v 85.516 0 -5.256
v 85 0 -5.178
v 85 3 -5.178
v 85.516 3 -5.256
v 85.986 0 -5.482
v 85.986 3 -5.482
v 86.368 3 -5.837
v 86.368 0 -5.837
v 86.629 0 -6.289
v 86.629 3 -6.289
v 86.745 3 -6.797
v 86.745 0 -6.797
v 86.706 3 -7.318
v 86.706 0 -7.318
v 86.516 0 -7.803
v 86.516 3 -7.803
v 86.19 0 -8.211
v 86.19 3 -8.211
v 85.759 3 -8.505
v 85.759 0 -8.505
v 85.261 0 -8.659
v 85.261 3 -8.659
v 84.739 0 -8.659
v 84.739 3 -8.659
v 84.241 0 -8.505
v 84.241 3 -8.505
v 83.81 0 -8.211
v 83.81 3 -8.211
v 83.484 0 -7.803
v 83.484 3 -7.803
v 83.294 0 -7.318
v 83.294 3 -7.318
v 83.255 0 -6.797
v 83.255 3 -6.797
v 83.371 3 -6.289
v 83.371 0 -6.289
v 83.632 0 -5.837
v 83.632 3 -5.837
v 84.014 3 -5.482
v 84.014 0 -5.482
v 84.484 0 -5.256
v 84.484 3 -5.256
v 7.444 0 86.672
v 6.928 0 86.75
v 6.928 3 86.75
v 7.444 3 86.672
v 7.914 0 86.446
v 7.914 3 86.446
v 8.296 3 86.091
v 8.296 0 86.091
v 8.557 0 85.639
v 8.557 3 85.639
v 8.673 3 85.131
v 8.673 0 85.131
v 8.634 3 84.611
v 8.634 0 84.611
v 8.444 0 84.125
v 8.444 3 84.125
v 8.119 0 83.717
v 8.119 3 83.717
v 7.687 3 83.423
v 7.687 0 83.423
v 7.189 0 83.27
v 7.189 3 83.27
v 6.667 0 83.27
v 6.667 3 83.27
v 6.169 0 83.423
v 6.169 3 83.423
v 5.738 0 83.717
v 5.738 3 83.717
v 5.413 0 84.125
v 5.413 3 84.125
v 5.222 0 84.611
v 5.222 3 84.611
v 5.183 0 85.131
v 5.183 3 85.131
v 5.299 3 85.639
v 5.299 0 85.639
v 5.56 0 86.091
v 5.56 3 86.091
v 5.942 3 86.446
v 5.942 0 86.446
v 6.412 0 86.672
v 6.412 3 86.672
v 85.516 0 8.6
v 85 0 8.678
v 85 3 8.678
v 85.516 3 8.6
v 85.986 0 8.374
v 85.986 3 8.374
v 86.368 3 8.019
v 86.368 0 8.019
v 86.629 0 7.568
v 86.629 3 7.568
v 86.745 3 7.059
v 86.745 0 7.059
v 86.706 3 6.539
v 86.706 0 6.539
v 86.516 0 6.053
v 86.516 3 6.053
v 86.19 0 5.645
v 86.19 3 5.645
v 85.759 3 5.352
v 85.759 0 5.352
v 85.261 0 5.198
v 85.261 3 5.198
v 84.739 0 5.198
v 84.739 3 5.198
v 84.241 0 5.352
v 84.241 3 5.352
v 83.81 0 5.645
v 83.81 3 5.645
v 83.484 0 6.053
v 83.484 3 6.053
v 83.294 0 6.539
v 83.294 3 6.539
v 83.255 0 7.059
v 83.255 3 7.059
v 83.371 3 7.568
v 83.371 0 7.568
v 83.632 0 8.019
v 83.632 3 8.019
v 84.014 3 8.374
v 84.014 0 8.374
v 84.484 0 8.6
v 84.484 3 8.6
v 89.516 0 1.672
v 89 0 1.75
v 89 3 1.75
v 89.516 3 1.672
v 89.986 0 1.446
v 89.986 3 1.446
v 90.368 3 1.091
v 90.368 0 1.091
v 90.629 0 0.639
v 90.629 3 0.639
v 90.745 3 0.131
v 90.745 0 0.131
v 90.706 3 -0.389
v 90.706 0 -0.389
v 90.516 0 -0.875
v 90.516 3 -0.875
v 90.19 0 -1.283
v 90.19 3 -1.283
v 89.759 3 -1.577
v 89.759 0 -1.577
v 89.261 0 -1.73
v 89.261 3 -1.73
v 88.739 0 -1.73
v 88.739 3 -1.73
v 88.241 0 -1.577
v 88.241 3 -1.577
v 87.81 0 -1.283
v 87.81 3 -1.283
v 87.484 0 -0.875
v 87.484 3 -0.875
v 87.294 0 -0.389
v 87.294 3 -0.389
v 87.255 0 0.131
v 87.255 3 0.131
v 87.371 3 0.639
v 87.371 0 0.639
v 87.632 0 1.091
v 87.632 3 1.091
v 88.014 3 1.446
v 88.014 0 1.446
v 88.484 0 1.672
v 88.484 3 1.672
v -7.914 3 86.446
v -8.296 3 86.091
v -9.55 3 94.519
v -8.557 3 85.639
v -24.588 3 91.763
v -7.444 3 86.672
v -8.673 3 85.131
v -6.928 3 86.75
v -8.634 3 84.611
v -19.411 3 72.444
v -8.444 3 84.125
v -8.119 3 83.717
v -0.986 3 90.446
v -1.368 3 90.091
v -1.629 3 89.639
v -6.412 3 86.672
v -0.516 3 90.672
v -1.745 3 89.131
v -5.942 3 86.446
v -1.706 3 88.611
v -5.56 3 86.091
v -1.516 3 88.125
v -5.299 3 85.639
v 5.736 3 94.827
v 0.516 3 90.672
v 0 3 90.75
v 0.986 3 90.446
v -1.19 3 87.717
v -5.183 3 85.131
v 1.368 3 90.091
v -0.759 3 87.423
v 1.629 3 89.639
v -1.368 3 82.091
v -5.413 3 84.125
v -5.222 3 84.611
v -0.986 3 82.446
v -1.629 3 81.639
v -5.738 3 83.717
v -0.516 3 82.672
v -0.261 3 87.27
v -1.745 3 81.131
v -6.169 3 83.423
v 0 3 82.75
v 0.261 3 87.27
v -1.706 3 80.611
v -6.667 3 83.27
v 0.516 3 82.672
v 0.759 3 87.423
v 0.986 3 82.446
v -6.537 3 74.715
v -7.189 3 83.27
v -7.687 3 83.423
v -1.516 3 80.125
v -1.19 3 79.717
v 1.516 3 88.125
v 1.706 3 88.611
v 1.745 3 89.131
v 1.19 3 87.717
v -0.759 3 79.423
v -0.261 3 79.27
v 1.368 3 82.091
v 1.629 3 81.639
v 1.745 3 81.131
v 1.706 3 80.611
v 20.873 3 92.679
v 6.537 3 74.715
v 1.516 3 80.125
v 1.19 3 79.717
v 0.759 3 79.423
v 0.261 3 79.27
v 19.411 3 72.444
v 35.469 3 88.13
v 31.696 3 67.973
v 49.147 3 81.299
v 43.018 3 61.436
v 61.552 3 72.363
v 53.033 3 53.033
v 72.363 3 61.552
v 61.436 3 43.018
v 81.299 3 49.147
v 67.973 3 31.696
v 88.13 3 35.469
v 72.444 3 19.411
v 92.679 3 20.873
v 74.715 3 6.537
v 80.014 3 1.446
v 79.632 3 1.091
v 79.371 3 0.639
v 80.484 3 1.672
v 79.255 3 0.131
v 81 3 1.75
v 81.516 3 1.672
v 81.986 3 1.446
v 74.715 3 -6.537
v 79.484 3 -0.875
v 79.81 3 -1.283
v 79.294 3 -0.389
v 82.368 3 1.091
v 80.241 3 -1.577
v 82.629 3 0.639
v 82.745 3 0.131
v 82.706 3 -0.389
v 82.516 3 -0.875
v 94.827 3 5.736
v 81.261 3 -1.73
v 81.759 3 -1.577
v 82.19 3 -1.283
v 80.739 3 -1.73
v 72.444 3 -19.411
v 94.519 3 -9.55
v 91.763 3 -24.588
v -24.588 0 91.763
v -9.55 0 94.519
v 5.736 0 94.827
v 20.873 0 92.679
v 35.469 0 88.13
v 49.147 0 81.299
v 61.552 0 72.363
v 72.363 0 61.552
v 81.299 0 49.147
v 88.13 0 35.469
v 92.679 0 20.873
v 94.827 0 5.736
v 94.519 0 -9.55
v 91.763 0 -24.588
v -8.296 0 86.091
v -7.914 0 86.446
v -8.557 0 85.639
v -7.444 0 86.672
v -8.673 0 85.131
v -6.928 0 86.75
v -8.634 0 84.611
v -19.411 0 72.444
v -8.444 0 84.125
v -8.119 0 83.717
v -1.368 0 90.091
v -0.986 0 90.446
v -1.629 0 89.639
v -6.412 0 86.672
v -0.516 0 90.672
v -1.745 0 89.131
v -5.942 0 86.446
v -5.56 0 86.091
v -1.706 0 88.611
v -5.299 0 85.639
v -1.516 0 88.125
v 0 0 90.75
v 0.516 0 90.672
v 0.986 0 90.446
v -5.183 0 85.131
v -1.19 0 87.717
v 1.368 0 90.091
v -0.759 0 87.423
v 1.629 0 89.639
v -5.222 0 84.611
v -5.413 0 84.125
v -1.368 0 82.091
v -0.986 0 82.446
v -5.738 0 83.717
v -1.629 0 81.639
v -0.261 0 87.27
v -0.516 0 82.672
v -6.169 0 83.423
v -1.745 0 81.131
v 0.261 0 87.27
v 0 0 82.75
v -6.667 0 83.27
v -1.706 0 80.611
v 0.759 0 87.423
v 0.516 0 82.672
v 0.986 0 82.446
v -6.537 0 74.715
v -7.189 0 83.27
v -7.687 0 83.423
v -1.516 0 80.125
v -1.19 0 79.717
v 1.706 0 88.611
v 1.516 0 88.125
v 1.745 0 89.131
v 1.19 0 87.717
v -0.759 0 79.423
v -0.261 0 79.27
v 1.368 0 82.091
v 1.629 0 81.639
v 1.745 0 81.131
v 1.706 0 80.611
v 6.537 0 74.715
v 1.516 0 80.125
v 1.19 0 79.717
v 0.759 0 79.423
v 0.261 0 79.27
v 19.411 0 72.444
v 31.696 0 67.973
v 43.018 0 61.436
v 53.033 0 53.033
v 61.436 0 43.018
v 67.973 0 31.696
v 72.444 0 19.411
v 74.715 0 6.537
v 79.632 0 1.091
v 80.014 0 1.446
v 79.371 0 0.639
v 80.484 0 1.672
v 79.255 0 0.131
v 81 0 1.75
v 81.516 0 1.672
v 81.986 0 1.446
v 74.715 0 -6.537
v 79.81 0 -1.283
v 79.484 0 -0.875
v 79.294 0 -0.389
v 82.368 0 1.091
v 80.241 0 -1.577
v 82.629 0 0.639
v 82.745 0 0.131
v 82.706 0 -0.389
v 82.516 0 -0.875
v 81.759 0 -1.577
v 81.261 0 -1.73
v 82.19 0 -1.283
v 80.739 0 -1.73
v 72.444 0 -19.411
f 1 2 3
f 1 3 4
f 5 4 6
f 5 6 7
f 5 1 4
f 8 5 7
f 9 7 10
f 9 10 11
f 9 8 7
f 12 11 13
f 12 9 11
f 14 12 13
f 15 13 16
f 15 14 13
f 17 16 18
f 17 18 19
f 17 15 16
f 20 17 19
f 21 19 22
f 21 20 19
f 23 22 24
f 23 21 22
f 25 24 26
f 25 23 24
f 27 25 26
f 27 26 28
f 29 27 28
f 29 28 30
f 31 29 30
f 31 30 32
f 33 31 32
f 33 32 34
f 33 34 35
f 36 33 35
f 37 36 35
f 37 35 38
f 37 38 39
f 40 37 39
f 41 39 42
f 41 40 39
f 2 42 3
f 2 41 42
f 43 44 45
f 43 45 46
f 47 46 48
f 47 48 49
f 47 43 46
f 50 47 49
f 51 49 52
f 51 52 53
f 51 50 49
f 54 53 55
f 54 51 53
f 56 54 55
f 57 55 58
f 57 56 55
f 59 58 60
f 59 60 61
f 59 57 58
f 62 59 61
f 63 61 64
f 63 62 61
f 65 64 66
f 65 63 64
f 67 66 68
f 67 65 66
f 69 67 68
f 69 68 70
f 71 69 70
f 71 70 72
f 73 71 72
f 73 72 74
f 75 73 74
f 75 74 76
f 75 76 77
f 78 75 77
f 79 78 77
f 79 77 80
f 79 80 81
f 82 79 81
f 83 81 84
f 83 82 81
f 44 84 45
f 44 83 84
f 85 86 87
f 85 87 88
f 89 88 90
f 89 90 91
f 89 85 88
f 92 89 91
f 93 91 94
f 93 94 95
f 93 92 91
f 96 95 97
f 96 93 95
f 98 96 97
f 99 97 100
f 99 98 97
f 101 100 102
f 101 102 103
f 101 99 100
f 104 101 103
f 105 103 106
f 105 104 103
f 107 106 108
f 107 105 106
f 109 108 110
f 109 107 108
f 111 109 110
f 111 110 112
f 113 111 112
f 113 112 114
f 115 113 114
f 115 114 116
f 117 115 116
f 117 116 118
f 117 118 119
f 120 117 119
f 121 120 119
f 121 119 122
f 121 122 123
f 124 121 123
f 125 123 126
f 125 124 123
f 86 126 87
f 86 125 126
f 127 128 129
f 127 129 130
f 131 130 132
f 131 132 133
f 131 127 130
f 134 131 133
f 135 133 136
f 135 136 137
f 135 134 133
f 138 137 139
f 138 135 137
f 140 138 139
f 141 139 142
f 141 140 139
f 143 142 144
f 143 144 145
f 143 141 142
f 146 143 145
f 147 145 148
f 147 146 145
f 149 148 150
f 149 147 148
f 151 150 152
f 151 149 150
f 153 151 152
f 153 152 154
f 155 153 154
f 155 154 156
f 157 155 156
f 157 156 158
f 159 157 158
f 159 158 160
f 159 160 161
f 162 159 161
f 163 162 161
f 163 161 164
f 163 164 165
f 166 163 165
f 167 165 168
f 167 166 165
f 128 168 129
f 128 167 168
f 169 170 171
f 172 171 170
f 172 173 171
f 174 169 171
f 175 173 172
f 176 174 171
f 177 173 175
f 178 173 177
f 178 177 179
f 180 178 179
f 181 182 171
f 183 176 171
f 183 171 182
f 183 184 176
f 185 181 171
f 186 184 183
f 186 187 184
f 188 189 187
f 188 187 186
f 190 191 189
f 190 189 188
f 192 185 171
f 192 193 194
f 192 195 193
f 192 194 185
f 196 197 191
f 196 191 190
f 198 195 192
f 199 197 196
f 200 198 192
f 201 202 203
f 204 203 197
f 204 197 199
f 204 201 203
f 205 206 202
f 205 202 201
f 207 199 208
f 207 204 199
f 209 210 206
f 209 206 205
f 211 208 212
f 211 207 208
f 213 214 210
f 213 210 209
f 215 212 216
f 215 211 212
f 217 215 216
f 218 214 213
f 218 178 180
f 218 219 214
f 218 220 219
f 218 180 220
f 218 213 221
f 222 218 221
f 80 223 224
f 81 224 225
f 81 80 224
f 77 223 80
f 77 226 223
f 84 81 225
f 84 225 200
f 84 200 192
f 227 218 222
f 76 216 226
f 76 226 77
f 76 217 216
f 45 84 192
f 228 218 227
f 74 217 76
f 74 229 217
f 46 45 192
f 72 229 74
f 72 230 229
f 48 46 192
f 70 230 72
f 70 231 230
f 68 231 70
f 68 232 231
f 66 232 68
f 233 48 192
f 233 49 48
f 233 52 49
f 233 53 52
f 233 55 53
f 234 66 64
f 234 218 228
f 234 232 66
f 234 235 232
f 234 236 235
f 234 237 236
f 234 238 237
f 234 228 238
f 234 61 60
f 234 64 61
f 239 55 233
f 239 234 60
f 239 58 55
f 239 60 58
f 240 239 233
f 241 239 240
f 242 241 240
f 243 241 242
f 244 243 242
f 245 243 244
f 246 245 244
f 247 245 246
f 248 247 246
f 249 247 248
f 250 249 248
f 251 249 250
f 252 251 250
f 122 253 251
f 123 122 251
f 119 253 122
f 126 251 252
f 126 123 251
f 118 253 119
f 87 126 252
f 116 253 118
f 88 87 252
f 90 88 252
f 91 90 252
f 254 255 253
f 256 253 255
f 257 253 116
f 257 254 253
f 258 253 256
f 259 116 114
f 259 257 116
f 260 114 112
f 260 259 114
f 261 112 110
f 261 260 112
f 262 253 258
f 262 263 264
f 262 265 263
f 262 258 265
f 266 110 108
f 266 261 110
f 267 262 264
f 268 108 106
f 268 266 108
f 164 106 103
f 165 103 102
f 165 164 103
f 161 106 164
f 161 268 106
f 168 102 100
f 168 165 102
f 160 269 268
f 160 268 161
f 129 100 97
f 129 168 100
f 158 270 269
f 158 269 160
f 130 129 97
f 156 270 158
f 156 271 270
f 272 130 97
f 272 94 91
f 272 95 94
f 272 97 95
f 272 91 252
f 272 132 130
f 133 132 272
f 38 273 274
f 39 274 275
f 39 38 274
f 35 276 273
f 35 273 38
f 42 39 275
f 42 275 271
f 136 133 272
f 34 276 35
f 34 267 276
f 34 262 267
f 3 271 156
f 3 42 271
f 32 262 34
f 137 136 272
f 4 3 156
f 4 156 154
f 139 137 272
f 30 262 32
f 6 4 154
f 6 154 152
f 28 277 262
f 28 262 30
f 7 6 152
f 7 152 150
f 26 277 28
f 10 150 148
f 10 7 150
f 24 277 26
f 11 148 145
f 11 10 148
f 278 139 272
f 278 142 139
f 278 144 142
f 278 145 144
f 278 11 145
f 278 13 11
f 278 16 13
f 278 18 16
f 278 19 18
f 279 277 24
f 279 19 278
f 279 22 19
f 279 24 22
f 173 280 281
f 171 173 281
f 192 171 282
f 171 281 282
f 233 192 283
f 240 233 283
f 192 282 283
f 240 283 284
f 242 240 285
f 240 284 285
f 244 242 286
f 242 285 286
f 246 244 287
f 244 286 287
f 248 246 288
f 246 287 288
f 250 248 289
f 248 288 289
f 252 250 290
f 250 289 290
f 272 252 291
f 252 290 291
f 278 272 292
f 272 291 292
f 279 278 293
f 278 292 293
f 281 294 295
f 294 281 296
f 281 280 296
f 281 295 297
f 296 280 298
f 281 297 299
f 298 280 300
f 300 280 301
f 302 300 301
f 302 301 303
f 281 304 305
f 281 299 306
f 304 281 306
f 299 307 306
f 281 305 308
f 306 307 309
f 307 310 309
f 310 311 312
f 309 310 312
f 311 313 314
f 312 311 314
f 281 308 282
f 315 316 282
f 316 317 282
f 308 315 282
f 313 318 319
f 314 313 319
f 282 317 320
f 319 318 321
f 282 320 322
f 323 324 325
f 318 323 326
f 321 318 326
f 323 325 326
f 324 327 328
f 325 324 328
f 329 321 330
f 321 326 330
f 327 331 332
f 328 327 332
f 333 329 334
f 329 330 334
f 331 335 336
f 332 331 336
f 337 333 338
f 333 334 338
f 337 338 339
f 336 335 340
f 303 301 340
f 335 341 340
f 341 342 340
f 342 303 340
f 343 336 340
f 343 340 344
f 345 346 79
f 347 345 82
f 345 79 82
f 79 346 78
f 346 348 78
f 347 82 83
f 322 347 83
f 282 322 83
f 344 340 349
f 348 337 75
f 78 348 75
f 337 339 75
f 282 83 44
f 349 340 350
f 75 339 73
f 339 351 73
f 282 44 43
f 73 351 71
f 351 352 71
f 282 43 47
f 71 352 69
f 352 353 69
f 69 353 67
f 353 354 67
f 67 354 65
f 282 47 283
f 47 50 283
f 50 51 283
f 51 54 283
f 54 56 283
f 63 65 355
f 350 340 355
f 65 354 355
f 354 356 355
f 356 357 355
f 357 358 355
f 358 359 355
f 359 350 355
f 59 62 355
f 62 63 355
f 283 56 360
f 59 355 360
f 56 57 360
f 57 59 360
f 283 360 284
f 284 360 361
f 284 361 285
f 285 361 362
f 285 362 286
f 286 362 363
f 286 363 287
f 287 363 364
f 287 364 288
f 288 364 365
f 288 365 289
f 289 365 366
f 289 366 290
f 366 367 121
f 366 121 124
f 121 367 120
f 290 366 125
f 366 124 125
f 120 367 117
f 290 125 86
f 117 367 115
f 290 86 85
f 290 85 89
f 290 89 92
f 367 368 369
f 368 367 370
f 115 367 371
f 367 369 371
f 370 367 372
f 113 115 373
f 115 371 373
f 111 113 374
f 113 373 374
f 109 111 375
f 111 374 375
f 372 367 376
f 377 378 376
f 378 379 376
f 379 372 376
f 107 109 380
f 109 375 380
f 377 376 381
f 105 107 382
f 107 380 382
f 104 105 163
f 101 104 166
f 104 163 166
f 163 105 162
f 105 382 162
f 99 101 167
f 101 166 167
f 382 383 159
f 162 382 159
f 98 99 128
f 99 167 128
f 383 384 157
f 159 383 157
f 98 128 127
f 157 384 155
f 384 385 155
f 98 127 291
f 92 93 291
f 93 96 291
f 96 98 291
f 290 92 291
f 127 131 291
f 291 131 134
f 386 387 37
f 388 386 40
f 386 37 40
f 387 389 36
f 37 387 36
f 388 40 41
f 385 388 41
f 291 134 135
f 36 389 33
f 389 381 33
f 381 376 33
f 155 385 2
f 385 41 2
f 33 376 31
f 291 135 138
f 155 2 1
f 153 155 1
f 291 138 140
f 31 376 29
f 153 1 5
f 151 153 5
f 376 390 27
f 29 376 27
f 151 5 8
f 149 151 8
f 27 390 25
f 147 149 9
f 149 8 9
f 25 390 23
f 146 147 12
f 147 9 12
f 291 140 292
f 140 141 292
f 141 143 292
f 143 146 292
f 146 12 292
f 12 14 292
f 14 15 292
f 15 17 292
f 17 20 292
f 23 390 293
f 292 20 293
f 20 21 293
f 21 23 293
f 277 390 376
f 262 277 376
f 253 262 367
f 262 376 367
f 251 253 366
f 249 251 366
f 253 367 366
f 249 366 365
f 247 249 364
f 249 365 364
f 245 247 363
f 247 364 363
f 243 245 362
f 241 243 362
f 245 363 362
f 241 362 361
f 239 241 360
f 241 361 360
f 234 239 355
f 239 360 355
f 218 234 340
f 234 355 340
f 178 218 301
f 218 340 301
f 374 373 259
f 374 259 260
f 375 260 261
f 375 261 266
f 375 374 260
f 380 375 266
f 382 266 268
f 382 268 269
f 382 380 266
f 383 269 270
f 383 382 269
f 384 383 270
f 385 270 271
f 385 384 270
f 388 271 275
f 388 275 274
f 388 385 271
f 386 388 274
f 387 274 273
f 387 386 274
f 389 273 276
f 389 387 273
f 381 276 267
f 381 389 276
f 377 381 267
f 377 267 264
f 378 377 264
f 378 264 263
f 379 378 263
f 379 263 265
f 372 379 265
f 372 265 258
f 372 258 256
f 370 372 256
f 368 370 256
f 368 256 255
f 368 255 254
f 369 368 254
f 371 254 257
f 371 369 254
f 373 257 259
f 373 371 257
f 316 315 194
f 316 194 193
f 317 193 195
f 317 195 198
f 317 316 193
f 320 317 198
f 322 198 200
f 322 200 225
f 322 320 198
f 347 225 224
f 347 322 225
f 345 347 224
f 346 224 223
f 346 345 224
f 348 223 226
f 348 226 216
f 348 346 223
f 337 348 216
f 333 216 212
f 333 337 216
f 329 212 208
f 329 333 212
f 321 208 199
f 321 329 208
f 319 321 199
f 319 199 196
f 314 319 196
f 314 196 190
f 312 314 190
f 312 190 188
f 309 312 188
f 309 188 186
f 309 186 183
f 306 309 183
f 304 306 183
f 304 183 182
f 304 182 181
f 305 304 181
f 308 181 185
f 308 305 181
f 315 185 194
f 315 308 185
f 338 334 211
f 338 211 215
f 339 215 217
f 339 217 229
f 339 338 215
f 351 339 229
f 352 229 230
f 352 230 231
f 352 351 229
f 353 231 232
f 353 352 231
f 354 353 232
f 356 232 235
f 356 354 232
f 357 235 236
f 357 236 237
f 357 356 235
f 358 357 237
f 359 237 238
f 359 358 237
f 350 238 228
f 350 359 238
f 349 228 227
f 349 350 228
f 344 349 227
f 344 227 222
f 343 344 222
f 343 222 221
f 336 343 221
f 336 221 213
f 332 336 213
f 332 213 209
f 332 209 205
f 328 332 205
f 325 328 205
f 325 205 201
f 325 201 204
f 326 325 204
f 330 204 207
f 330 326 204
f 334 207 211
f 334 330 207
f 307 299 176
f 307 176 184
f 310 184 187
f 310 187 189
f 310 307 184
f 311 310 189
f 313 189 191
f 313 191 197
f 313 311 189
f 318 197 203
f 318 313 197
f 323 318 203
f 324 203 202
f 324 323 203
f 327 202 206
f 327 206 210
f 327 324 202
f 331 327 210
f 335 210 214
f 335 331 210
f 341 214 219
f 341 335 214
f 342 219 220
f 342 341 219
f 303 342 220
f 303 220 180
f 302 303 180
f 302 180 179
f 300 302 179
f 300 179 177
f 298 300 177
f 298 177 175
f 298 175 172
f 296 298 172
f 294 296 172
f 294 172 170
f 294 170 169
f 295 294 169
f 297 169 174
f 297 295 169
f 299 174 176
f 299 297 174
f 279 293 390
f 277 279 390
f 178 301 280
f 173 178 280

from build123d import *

# Parameters (mm, degrees)
SKETCH_1_R      = 1.75
EXTRUDE_1_DEPTH = 3


with BuildPart() as part:
    # 草图1 → 凸台-拉伸1 (new body)
    with BuildSketch(Plane(origin=(0, 0, 0), x_dir=(1, 0, 0), z_dir=(0, 1, 0))):
        with BuildLine():
            Line((-19.411428383, -72.444436972), (-24.587809285, -91.762953497))
            ThreePointArc((-24.587809285, -91.762953497), (67.175144213, -67.175144213), (91.762953497, 24.587809285))
            Line((91.762953497, 24.587809285), (72.444436972, 19.411428383))
            ThreePointArc((72.444436972, 19.411428383), (53.033008589, -53.033008589), (-19.411428383, -72.444436972))
        make_face()
        with Locations(Location((0, -89, 0), (0, 0, 270))):
            Circle(SKETCH_1_R, mode=Mode.SUBTRACT)
        with Locations(Location((0, -81, 0), (0, 0, 270))):
            Circle(SKETCH_1_R, mode=Mode.SUBTRACT)
        with Locations(Location((-6.92820323, -85, 0), (0, 0, 270))):
            Circle(SKETCH_1_R, mode=Mode.SUBTRACT)
        with Locations(Location((6.92820323, -85, 0), (0, 0, 270))):
            Circle(SKETCH_1_R, mode=Mode.SUBTRACT)
        with Locations(Location((85, -6.92820323, 0), (0, 0, 270))):
            Circle(SKETCH_1_R, mode=Mode.SUBTRACT)
        with Locations(Location((81, 0, 0), (0, 0, 270))):
            Circle(SKETCH_1_R, mode=Mode.SUBTRACT)
        with Locations(Location((85, 6.92820323, 0), (0, 0, 270))):
            Circle(SKETCH_1_R, mode=Mode.SUBTRACT)
        with Locations(Location((89, 0, 0), (0, 0, 270))):
            Circle(SKETCH_1_R, mode=Mode.SUBTRACT)
    extrude(amount=EXTRUDE_1_DEPTH)


solid = part.part
